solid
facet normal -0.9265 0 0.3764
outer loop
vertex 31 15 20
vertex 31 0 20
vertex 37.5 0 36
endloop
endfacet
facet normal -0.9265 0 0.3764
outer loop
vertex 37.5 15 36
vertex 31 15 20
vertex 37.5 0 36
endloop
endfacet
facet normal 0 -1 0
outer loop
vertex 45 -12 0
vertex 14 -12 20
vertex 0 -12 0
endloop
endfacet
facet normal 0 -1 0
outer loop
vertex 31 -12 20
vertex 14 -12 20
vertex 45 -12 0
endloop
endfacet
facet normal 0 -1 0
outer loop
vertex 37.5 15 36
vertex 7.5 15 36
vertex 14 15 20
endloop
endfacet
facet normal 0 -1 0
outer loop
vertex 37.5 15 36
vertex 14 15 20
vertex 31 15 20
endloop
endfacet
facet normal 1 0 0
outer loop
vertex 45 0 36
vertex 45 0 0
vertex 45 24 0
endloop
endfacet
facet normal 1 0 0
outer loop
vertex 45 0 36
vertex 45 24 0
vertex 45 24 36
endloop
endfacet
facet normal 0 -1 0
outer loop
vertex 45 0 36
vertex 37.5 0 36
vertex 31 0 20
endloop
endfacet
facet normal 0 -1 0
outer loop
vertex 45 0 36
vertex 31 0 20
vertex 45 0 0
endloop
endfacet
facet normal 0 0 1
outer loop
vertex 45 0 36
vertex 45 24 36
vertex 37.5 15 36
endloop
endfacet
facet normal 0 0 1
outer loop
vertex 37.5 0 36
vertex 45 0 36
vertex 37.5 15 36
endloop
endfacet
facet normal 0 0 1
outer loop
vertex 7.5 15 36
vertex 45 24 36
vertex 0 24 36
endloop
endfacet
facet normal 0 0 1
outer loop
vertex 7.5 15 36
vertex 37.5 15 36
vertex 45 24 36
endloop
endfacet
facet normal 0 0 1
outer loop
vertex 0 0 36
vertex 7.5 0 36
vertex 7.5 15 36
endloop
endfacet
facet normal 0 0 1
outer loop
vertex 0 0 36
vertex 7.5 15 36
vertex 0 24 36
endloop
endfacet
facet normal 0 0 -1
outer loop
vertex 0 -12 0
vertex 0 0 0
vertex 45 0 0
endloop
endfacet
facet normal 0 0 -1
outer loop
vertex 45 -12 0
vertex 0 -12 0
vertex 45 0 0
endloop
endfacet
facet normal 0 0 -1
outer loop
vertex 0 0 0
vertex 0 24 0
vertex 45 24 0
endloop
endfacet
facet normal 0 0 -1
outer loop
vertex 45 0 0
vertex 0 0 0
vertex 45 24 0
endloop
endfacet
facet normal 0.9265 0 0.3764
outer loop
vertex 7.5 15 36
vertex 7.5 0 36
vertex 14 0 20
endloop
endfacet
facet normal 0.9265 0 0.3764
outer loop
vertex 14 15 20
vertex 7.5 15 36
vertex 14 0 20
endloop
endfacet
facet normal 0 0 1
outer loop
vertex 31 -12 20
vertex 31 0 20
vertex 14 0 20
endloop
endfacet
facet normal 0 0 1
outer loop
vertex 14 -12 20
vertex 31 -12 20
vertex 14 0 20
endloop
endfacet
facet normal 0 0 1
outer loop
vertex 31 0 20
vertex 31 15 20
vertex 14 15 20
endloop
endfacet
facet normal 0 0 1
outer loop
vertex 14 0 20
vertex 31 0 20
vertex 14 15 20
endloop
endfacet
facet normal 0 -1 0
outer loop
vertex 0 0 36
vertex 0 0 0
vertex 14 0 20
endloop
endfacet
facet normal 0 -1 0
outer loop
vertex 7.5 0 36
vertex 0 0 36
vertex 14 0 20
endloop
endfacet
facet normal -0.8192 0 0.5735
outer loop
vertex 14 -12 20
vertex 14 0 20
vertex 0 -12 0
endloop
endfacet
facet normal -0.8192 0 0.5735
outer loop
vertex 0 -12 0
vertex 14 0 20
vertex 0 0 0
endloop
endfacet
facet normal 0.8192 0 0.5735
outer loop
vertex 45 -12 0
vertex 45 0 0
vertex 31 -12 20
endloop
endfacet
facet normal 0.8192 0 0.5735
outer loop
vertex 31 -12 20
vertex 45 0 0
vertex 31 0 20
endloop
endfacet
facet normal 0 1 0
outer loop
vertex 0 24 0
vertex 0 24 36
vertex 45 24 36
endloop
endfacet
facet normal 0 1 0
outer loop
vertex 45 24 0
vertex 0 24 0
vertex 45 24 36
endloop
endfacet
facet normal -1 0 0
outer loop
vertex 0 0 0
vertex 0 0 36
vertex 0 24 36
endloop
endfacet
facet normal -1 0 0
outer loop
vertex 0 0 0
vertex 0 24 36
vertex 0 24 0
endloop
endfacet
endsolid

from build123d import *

# Parameters (mm, degrees)
F1_DEPTH = 24
F2_DEPTH = 15
F3_DEPTH = 12


with BuildPart() as f1:
    # F0 (on Front) → F1 (new body)
    with BuildSketch(Plane.XZ):
        Polygon((0, 36), (0, 0), (14, 20), (7.5, 36), align=None)
        Polygon((7.5, 36), (14, 20), (31, 20), (37.5, 36), align=None)
        Polygon((31, 20), (45, 0), (45, 36), (37.5, 36), align=None)
        Polygon((14, 20), (0, 0), (45, 0), (31, 20), align=None)
    extrude(amount=-F1_DEPTH)

    # F0 (on Front) → F2 (cut)
    with BuildSketch(Plane.XZ):
        Polygon((7.5, 36), (14, 20), (31, 20), (37.5, 36), align=None)
    extrude(amount=-F2_DEPTH, mode=Mode.SUBTRACT)

    # F0 (on Front) → F3 (join)
    with BuildSketch(Plane.XZ):
        Polygon((14, 20), (0, 0), (45, 0), (31, 20), align=None)
    extrude(amount=F3_DEPTH)


solid = f1.part
